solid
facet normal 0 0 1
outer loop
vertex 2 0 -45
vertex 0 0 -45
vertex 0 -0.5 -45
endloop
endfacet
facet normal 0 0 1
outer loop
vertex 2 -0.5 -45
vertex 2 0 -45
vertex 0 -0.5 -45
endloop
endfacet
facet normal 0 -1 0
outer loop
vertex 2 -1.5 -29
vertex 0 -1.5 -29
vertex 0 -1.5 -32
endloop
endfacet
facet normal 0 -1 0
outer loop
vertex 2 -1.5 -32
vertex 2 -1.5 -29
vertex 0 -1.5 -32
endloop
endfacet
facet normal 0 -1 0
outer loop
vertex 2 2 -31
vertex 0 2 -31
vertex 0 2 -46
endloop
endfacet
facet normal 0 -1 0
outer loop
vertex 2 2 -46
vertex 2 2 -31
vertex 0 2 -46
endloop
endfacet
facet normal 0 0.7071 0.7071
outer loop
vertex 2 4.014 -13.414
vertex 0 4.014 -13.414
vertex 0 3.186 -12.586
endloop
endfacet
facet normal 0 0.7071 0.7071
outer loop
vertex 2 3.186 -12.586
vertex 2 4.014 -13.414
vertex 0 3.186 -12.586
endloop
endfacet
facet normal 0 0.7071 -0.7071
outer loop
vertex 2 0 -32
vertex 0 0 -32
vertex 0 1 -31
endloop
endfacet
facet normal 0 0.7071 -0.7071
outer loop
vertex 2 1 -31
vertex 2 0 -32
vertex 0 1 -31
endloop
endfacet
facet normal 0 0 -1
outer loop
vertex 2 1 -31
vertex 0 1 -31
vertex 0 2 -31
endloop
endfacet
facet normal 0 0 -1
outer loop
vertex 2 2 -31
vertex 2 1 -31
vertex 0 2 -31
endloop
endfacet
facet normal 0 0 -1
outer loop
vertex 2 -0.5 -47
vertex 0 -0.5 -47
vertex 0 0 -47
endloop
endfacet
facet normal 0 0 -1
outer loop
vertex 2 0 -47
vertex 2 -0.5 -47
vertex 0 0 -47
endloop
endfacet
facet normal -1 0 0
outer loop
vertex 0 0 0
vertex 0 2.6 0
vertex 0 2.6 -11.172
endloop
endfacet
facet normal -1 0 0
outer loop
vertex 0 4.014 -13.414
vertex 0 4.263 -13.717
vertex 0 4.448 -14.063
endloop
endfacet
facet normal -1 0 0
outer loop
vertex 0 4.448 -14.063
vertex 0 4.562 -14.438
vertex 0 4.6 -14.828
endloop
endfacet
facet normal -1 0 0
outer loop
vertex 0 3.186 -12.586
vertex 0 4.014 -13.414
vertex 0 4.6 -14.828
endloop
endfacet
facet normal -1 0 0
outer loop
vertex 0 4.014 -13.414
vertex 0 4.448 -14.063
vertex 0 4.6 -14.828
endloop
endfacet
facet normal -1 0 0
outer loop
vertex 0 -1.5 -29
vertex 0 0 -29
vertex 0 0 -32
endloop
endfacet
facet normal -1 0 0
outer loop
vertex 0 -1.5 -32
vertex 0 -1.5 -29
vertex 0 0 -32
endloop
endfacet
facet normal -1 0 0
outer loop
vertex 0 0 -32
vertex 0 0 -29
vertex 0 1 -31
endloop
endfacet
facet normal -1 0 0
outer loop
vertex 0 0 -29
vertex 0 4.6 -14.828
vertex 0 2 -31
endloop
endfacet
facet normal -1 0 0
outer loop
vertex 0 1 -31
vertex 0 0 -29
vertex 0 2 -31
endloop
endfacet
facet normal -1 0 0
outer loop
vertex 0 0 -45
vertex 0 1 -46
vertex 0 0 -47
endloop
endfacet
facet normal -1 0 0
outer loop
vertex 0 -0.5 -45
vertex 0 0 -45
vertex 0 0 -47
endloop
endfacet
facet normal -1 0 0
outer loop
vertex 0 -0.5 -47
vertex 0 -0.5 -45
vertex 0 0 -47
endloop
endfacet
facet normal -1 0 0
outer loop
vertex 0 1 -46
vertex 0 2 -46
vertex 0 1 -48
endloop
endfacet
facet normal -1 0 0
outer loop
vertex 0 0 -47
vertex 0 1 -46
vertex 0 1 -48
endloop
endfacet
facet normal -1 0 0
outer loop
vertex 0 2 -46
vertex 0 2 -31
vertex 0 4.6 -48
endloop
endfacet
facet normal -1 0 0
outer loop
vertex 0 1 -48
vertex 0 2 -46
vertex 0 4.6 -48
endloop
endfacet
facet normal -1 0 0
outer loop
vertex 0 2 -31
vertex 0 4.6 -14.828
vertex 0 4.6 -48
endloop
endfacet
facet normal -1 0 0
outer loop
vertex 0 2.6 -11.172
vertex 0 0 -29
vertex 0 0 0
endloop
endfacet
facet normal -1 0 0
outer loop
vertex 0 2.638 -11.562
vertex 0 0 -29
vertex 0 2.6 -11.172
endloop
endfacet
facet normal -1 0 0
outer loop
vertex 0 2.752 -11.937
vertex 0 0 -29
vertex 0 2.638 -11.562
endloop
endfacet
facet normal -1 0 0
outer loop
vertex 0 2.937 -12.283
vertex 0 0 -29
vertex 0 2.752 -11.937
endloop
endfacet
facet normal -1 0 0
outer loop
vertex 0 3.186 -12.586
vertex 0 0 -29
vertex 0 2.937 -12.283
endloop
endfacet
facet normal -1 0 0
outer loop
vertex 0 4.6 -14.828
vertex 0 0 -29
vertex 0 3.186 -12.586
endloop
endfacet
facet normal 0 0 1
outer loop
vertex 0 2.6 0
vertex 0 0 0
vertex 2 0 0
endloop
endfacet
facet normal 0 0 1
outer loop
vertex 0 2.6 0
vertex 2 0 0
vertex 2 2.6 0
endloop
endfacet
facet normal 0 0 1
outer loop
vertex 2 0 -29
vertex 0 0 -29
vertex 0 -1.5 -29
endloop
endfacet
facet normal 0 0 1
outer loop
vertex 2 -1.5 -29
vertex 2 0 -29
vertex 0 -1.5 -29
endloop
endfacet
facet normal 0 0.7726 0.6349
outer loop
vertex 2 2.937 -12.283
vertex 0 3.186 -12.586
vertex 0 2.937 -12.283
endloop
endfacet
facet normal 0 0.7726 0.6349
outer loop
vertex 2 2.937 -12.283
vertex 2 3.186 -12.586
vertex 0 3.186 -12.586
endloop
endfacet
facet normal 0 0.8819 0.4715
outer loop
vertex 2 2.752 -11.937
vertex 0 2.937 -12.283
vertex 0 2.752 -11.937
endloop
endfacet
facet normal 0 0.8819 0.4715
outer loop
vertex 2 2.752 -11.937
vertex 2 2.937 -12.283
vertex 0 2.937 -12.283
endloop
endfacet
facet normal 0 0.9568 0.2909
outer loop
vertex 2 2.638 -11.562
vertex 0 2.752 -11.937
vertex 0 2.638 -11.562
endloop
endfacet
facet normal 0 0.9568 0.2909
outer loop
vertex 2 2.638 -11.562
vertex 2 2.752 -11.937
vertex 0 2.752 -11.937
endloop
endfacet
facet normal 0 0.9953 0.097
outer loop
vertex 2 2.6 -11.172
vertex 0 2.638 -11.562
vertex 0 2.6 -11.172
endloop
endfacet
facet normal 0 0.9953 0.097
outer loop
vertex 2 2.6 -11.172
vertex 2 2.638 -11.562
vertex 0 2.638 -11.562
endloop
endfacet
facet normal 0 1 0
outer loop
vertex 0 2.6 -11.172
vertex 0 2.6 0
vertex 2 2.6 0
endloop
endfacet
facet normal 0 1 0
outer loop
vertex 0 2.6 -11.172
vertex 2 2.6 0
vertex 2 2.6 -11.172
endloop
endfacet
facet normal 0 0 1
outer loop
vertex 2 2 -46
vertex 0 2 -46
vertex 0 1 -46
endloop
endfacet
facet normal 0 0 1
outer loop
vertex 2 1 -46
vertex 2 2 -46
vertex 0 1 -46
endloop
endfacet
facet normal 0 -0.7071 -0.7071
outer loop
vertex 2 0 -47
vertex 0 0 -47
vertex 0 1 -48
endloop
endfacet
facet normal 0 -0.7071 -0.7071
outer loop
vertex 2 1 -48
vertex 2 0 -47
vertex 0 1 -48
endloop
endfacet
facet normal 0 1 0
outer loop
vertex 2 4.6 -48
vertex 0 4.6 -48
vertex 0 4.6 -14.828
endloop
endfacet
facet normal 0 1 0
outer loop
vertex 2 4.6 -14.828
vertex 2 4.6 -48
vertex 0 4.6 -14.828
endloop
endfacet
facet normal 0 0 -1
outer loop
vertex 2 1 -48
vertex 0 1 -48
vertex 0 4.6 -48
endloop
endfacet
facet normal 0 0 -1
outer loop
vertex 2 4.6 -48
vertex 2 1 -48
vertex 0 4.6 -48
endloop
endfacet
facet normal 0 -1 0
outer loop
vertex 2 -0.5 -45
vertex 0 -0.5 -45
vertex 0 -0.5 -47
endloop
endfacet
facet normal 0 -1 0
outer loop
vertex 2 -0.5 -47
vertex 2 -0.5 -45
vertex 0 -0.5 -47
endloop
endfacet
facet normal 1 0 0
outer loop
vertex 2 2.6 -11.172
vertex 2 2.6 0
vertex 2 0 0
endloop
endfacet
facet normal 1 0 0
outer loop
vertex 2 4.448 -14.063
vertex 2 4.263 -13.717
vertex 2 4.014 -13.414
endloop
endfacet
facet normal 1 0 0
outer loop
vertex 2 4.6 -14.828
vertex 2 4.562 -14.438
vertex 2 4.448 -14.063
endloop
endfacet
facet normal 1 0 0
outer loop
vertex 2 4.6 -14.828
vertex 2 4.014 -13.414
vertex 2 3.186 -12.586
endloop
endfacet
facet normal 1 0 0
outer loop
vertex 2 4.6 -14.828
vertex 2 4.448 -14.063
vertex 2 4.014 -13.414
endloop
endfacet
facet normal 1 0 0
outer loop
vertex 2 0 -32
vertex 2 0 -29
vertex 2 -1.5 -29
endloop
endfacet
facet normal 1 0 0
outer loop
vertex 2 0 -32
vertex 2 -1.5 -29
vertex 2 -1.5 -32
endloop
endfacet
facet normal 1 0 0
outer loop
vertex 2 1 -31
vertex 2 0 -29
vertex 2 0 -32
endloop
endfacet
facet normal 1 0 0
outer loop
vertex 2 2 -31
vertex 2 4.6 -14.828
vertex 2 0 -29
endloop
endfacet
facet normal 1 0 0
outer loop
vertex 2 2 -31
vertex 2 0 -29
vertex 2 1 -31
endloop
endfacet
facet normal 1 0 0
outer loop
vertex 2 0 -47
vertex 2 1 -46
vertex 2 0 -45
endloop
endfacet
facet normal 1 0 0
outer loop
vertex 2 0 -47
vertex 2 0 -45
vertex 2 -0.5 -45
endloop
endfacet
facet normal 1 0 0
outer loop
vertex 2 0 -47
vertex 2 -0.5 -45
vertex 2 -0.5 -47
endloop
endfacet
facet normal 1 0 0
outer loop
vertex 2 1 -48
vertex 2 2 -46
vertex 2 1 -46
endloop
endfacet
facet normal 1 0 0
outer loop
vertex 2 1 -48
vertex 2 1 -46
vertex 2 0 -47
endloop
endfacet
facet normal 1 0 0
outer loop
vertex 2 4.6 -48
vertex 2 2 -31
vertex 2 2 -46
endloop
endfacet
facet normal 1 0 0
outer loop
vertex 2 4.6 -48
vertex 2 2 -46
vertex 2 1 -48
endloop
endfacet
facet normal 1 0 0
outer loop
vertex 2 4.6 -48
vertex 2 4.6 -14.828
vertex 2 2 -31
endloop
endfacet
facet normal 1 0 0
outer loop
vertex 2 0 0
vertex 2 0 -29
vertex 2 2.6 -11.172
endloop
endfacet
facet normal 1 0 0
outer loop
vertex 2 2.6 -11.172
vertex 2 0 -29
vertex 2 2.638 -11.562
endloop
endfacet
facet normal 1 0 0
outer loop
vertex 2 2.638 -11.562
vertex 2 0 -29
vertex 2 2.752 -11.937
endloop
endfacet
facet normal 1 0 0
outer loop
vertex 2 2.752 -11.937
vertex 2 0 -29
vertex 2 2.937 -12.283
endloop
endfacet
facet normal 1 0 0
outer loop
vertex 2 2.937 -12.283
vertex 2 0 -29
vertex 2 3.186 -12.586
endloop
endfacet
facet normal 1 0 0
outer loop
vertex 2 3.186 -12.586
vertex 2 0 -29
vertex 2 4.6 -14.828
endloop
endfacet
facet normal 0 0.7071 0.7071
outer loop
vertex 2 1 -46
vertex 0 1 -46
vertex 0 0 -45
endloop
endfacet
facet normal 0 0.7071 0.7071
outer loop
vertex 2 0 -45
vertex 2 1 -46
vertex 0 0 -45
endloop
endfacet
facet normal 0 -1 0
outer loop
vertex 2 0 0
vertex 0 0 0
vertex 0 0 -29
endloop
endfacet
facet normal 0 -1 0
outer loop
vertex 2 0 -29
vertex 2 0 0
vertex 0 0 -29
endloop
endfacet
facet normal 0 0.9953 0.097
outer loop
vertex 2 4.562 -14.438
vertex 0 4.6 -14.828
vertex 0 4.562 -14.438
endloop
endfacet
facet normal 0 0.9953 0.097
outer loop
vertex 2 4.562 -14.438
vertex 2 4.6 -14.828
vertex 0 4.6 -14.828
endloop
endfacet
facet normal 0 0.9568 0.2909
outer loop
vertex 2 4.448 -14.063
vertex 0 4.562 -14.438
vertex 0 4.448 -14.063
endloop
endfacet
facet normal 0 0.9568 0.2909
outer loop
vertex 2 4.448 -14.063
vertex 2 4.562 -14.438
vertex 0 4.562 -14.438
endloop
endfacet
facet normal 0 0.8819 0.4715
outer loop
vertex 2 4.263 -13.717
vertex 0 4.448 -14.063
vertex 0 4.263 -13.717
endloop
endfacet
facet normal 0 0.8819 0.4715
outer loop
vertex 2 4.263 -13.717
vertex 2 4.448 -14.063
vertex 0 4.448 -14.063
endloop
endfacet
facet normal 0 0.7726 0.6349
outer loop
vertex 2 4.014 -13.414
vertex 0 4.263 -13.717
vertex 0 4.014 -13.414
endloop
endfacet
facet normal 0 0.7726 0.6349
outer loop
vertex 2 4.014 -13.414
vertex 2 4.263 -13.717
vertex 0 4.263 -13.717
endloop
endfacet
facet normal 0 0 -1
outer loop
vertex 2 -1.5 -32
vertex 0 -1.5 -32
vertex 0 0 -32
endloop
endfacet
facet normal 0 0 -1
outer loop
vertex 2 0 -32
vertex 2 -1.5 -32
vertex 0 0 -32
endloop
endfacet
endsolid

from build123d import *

# Parameters (mm, degrees)
SKETCH_1_W      = 12
SKETCH_1_H      = 2.6
EXTRUDE_1_DEPTH = 2
FILLET_1_R      = 2


with BuildPart() as part:
    # Эскиз1 → Бобышка-Вытянуть1 (new body)
    with BuildSketch(Plane(origin=(0, 0, 0), x_dir=(0, 0, -1), z_dir=(1, 0, 0))):
        Polygon((48, 1), (48, 4.6), (29, 4.6), (14, 4.6), (12, 2.6), (12, 0), (29, 0), (29, -1.5), (32, -1.5), (32, 0), (31, 1), (31, 2), (46, 2), (46, 1), (45, 0), (45, -0.5), (47, -0.5), (47, 0), align=None)
        with Locations((6, 1.3)):
            Rectangle(SKETCH_1_W, SKETCH_1_H)
    extrude(amount=EXTRUDE_1_DEPTH)

    # Скругление1
    fillet_1_edges = [part.edges().sort_by_distance(p)[0] for p in [
        (1, 2.6, -12),
        (1, 4.6, -14),
    ]]
    fillet(fillet_1_edges, radius=FILLET_1_R)


solid = part.part
